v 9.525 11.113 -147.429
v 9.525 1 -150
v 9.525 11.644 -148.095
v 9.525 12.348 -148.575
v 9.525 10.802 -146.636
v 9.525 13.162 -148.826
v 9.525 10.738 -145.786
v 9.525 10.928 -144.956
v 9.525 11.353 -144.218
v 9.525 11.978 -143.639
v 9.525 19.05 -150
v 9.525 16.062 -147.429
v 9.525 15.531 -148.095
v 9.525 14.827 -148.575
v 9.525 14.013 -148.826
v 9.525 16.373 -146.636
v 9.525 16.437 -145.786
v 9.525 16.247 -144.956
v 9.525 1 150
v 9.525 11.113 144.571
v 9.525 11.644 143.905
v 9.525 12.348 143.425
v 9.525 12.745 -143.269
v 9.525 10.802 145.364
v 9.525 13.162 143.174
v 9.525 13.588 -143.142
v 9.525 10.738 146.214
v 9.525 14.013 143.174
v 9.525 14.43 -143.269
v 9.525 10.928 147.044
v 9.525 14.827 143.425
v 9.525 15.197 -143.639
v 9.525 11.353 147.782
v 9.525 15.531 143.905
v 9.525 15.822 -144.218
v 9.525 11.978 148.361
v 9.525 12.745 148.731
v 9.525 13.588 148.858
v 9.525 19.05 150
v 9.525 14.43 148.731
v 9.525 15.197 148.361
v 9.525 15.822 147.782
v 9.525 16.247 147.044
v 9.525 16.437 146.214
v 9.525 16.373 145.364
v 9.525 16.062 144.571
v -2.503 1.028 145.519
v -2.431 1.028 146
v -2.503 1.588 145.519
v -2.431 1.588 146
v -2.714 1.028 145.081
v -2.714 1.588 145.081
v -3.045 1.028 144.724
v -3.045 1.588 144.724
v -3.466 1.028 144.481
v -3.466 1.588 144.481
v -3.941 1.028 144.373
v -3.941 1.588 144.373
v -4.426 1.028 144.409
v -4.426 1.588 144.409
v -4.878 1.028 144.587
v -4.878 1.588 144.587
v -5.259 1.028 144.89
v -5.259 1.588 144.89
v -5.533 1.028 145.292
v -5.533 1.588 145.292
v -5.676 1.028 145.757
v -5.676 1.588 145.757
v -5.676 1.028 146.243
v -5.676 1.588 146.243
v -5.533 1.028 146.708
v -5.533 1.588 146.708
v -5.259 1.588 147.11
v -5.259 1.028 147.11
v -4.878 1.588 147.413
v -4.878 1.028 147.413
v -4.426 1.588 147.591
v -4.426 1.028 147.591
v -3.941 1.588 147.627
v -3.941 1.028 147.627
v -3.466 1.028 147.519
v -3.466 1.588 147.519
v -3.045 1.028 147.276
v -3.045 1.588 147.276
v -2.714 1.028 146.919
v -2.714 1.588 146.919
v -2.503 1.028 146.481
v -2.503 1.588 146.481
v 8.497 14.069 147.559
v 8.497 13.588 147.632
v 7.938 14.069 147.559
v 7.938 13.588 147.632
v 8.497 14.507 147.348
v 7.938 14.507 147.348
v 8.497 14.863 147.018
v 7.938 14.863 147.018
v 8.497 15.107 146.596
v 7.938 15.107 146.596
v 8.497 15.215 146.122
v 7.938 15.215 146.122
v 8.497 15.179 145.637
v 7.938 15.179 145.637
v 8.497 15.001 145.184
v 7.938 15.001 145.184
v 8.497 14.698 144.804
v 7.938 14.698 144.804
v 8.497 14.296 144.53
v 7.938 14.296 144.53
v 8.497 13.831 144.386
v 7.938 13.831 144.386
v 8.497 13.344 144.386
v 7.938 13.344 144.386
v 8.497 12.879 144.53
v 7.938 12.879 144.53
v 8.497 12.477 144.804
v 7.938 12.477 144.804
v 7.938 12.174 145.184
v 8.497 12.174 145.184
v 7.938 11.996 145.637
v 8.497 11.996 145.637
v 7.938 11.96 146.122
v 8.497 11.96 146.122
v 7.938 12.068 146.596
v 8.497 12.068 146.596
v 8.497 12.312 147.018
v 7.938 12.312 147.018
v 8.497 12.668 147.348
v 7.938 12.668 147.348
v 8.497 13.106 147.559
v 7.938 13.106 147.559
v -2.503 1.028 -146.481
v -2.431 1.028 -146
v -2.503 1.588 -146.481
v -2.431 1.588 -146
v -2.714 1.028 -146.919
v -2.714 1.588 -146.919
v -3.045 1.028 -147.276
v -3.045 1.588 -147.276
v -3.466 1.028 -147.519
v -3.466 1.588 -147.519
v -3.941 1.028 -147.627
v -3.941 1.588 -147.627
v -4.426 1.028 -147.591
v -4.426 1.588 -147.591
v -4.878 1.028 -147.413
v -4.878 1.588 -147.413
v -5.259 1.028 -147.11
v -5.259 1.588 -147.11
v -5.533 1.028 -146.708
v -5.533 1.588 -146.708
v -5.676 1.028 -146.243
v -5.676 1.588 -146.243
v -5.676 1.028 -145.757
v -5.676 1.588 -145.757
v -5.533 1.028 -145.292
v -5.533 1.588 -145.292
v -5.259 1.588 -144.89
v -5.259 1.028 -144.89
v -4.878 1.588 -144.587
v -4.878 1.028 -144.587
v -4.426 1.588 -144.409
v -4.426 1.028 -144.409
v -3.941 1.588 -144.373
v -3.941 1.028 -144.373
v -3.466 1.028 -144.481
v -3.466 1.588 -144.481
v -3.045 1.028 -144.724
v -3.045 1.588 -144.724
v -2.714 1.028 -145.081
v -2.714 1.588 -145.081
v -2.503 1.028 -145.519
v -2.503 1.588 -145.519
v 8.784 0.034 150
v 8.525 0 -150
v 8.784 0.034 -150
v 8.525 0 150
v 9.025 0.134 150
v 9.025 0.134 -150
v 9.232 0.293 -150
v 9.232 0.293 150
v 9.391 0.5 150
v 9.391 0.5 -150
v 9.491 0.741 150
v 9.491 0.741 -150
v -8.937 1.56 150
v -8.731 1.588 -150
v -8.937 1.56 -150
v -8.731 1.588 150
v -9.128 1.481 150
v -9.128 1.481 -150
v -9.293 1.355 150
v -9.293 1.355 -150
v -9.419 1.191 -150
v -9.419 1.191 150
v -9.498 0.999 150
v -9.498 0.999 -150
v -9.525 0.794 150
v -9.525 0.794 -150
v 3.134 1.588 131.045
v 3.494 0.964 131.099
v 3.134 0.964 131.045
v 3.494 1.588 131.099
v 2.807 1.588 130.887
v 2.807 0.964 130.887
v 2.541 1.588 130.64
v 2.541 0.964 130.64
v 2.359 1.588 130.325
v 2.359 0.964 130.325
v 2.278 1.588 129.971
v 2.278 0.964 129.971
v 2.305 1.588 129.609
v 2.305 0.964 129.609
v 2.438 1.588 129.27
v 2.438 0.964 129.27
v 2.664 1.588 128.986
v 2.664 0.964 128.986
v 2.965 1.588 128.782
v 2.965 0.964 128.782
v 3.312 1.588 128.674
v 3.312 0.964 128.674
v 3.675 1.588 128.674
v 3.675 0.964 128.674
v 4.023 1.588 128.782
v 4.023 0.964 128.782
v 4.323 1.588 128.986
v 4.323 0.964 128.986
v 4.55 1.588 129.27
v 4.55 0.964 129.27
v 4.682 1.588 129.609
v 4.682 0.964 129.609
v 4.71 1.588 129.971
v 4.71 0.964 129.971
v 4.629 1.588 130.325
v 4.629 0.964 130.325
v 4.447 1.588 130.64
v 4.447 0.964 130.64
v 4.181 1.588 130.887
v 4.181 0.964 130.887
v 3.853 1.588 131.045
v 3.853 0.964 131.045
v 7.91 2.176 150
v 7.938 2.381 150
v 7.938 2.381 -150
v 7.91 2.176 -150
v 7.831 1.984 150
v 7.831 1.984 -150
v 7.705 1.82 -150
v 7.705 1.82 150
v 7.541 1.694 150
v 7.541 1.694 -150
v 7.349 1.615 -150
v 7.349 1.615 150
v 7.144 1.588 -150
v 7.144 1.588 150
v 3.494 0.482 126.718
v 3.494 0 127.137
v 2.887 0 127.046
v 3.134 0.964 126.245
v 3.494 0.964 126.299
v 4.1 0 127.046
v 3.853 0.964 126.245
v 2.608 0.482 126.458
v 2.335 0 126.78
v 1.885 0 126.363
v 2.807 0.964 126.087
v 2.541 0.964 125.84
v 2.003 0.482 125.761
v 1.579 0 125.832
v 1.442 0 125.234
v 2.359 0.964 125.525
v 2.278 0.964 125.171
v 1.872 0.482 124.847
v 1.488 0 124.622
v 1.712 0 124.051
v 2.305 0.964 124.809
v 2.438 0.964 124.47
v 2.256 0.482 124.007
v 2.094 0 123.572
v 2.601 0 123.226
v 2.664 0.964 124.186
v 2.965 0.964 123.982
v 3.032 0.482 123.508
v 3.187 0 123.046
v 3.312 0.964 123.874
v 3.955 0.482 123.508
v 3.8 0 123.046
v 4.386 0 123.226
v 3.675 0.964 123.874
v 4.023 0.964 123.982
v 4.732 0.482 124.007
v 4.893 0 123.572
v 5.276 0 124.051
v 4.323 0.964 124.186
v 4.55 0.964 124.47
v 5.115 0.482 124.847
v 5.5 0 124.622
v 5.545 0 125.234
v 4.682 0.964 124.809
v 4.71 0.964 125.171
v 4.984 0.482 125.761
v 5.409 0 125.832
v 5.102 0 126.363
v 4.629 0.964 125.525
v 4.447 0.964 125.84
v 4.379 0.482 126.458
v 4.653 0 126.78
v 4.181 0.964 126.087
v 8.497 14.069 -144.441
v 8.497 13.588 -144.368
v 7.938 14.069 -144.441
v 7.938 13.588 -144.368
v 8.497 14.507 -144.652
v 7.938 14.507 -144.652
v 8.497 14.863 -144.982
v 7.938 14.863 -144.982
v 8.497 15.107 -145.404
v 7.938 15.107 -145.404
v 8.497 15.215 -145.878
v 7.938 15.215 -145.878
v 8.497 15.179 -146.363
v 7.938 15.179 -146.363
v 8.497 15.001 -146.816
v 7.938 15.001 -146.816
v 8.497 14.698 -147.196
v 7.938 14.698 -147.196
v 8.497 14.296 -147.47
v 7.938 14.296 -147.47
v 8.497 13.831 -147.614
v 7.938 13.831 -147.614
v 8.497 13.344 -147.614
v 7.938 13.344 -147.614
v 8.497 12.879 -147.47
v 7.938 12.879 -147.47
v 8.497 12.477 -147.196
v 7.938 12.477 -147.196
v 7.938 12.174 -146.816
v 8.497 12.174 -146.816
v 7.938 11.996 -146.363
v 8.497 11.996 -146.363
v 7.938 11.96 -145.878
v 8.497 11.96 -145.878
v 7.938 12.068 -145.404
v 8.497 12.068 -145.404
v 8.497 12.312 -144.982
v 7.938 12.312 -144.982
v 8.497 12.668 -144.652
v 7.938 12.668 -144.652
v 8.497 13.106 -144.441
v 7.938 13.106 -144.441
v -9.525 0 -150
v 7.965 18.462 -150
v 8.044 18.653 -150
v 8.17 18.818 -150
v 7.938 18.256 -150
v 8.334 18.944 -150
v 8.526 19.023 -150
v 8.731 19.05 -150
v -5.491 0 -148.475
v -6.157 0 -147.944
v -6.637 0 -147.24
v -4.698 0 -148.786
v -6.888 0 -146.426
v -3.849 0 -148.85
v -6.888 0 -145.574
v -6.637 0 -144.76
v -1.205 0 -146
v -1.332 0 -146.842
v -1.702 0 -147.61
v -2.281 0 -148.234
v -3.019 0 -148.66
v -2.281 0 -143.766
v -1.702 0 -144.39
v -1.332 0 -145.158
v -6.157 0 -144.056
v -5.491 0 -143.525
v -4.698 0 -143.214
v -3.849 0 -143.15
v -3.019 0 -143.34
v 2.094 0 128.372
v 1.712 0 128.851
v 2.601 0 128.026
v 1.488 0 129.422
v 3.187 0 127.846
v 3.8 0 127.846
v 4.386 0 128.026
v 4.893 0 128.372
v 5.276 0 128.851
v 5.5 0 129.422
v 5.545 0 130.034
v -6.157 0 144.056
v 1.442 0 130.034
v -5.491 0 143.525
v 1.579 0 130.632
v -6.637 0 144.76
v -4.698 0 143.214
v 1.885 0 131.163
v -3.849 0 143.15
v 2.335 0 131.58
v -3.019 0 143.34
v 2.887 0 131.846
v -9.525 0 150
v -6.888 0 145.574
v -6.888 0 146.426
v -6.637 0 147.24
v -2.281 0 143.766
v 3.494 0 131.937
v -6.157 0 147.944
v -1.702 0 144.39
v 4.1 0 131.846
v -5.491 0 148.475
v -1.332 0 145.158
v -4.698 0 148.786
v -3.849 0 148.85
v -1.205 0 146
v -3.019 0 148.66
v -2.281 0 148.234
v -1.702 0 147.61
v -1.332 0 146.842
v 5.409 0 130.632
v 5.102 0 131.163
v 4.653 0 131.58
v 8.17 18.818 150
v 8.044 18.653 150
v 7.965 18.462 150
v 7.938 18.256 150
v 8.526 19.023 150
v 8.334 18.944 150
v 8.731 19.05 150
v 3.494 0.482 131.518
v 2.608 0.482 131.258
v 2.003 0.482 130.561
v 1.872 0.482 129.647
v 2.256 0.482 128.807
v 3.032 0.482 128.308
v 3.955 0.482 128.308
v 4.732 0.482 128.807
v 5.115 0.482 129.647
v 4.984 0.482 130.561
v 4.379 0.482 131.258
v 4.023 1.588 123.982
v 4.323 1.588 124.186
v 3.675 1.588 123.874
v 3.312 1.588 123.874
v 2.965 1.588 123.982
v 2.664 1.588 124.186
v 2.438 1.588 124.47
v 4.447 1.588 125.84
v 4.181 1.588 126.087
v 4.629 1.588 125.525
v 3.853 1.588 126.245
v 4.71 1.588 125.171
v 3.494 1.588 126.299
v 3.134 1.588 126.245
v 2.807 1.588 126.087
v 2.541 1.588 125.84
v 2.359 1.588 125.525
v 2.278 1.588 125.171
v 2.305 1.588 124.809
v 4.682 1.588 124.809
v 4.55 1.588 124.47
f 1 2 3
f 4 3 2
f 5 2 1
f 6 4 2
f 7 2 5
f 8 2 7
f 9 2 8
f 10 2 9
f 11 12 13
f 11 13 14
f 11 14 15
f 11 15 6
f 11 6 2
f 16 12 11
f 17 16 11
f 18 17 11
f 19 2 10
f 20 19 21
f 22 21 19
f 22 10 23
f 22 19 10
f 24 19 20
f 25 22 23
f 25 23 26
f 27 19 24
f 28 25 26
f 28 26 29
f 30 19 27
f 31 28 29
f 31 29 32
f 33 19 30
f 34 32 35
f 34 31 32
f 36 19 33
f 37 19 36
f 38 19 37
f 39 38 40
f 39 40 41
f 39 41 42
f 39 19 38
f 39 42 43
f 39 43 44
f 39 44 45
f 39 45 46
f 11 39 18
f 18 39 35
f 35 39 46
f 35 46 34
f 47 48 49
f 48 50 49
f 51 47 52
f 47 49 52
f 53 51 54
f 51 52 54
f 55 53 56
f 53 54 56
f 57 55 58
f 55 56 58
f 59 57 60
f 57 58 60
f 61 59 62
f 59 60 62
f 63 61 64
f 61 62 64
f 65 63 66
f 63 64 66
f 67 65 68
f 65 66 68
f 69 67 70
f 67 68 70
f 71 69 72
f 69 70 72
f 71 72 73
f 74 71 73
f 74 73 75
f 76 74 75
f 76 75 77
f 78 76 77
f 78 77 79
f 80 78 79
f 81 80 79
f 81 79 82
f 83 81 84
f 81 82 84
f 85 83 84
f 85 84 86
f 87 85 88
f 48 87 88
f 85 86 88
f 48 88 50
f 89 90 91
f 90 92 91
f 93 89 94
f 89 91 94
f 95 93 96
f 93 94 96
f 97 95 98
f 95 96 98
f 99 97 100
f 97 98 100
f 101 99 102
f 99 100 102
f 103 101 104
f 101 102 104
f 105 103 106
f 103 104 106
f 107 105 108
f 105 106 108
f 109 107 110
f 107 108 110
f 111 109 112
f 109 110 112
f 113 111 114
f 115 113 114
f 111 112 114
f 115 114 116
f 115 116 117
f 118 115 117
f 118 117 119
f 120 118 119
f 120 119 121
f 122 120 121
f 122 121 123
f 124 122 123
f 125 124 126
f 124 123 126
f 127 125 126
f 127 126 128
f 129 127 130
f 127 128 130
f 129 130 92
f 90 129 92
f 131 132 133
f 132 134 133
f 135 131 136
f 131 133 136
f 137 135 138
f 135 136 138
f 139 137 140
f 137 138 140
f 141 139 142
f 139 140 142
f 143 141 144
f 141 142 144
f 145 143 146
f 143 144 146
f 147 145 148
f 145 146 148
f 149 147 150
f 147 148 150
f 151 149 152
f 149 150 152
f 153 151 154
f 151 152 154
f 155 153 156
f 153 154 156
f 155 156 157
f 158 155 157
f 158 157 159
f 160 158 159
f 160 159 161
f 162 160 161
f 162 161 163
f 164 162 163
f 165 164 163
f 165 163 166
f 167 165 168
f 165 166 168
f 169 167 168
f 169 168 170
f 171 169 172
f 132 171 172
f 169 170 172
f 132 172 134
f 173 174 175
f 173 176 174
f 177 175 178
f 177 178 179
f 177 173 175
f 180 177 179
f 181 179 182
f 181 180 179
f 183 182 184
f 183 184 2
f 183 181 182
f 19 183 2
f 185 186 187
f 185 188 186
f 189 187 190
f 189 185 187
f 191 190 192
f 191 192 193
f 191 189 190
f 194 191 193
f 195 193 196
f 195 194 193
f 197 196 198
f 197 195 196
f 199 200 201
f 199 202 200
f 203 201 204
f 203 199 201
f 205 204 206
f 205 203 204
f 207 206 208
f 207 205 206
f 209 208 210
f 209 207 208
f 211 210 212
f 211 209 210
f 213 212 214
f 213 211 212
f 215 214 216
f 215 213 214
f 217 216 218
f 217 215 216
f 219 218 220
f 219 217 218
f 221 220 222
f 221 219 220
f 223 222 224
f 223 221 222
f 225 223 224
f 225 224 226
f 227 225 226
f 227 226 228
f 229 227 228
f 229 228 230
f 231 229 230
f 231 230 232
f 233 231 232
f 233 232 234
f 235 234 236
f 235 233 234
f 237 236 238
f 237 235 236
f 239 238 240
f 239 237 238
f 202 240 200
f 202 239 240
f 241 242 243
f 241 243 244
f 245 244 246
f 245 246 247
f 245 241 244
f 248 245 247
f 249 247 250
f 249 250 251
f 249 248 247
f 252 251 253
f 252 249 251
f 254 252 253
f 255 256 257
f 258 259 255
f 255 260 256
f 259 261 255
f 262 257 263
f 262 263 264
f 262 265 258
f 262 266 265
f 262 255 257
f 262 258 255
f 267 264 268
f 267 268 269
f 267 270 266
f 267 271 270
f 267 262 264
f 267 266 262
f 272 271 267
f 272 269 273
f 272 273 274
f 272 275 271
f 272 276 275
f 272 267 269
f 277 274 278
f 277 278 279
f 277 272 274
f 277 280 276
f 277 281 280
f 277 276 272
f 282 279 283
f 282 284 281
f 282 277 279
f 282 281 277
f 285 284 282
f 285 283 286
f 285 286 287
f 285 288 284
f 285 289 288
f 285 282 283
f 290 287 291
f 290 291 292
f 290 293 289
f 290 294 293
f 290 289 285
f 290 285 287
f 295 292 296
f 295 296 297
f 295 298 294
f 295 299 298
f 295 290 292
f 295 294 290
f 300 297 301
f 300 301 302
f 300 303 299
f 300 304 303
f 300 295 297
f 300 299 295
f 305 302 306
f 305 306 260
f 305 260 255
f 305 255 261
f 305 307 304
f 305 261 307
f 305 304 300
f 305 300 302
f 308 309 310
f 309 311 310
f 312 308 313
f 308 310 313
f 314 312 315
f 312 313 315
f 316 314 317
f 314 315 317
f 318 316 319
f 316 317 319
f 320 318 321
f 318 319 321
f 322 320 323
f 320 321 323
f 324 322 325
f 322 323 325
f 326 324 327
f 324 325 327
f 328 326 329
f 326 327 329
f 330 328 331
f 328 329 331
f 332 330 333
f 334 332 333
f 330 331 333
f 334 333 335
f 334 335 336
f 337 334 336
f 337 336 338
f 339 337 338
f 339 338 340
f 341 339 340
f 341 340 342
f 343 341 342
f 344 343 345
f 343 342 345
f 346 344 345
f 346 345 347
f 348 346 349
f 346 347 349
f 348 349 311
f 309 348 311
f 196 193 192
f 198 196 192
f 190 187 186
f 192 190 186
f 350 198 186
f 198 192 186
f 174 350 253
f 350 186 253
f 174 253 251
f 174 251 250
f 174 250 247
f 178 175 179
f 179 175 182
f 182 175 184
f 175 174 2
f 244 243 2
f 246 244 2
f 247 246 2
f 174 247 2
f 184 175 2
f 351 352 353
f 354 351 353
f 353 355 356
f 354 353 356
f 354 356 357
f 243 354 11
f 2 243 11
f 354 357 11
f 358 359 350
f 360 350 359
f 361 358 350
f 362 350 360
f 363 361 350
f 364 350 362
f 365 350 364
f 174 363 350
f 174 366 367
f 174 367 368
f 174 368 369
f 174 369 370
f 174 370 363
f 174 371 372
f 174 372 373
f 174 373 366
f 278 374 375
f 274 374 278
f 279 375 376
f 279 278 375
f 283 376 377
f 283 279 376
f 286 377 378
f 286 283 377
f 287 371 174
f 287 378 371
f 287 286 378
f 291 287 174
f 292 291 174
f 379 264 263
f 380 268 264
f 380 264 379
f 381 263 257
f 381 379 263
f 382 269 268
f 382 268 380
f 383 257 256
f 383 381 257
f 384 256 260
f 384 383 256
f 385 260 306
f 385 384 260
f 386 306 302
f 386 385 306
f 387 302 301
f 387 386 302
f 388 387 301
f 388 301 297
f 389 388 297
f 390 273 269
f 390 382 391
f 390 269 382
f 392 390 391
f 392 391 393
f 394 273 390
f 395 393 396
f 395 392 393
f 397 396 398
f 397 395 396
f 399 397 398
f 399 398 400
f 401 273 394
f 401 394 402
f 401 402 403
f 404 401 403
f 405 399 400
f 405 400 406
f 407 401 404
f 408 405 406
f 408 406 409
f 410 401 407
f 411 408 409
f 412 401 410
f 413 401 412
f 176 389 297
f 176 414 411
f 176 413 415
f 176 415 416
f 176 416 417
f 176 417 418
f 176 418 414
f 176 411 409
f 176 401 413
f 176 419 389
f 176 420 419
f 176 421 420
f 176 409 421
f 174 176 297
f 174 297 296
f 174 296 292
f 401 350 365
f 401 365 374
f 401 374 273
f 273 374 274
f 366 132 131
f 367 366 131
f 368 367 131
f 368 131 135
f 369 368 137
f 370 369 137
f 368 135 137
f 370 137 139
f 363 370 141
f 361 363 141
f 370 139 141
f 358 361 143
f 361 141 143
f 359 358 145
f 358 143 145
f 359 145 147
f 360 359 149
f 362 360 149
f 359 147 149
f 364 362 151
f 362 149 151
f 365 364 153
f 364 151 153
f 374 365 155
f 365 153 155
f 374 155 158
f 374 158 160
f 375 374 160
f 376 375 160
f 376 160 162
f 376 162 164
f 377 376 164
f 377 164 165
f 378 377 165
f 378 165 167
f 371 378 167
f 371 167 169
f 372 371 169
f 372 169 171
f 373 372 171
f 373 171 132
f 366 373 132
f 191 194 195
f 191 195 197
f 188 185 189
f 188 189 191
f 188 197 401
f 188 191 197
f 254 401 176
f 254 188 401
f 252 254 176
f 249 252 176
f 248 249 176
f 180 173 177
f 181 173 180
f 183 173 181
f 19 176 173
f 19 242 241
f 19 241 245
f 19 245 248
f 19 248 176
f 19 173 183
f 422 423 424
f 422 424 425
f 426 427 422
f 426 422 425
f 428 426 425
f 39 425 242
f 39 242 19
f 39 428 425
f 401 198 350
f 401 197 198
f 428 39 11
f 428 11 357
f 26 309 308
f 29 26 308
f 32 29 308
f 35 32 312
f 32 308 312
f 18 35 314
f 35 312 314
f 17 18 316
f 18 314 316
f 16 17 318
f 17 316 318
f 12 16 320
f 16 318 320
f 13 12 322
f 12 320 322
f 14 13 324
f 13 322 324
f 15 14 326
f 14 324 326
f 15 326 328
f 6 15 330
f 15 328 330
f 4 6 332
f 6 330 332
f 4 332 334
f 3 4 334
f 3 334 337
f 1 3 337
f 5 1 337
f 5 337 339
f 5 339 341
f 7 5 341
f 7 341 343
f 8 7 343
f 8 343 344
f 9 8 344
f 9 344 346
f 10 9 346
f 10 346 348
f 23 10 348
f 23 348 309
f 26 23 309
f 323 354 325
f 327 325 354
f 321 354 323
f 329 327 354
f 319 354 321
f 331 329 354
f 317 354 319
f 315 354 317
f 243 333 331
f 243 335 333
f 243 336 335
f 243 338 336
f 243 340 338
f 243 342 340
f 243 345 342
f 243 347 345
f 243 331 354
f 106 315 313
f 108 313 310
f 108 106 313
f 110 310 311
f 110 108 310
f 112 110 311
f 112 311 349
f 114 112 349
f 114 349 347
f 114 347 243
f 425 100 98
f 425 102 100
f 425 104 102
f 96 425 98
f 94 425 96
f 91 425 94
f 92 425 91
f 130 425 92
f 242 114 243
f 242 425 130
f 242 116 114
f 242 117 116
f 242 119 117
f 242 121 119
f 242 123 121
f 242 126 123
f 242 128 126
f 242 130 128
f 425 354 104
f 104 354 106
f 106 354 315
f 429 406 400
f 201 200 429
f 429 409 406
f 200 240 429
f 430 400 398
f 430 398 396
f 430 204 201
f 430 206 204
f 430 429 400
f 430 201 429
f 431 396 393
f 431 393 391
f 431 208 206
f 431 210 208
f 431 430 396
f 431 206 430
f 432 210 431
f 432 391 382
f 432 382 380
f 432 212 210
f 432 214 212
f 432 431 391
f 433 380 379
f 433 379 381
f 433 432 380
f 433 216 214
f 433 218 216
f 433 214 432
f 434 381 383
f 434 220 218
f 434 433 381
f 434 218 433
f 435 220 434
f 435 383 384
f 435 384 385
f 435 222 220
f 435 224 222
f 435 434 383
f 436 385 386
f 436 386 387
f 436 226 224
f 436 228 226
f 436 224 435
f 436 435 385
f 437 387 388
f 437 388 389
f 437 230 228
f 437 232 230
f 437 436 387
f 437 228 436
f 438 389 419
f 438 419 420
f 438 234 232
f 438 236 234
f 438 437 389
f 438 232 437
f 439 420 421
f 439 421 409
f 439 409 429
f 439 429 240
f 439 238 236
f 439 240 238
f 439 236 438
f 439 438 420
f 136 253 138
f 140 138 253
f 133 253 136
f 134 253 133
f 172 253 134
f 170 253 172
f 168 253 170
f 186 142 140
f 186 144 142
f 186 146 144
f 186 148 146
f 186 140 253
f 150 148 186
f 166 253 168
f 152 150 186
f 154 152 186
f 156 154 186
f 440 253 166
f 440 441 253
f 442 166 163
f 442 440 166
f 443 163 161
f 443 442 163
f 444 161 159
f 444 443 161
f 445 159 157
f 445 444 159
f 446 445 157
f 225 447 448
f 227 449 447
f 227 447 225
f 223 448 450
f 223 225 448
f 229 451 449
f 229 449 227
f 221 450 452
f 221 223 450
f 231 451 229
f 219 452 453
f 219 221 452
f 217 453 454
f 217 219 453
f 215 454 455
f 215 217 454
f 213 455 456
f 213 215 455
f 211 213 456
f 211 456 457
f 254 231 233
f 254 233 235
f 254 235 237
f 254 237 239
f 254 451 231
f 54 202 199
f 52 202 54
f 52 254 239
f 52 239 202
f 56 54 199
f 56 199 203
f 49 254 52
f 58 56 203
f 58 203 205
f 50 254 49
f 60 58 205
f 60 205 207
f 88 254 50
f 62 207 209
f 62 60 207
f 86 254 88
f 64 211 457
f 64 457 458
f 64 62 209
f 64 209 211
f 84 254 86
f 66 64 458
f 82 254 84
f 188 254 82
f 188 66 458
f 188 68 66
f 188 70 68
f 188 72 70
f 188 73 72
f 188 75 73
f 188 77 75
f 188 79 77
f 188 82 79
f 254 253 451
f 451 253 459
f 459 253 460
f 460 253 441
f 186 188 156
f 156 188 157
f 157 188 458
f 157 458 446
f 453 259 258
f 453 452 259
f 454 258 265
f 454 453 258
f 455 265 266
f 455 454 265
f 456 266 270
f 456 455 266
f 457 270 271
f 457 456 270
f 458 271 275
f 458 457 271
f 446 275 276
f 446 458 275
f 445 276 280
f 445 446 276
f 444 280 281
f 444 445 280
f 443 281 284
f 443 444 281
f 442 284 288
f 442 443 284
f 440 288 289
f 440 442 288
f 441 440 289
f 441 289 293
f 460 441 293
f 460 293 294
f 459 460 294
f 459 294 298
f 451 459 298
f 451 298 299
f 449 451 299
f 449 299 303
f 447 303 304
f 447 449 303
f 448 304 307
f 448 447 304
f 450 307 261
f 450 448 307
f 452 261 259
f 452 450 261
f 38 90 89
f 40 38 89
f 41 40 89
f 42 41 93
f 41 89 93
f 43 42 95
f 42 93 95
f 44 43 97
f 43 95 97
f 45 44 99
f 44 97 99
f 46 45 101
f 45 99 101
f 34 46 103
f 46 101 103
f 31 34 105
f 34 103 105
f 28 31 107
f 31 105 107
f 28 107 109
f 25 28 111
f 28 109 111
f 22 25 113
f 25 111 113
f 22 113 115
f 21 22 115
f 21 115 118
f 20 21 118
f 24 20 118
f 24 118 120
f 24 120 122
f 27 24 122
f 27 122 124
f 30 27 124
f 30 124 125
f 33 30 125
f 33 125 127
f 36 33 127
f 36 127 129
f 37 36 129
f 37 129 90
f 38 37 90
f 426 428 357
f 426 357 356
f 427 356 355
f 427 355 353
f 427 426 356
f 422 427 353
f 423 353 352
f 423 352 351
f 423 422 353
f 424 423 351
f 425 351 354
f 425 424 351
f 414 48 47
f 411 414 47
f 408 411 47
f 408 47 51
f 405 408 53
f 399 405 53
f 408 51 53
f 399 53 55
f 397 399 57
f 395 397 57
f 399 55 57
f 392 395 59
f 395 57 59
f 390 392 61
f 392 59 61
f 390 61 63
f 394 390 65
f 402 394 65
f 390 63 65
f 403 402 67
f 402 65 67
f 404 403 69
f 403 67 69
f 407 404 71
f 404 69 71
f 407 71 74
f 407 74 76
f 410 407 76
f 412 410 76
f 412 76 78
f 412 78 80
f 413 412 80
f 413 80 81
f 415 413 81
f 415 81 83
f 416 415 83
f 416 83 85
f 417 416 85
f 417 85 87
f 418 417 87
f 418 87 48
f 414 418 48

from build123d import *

# Parameters (mm, degrees)
BOSS_EXTRUDE1_DEPTH                               = 150
CSK_FOR_4_FLAT_HEAD_MACHINE_SCREW_100_D           = 3.2639
CSK_FOR_4_FLAT_HEAD_MACHINE_SCREW_100_CSINK_D     = 5.715
CSK_FOR_4_FLAT_HEAD_MACHINE_SCREW_100_CSINK_ANGLE = 100
CSK_FOR_4_FLAT_HEAD_MACHINE_SCREW_2_D             = 3.2639
CSK_FOR_4_FLAT_HEAD_MACHINE_SCREW_2_CSINK_D       = 5.715
CSK_FOR_4_FLAT_HEAD_MACHINE_SCREW_2_CSINK_ANGLE   = 100
FILLET1_R                                         = 1
F_2_CLEARANCE_HOLE1_AT_2_COUNT                    = 2
F_2_CLEARANCE_HOLE1_AT_2_PITCH                    = 4.8


with BuildPart() as part:
    # Sketch2 → Boss-Extrude1 (new, symmetric)
    with BuildSketch(Plane.XY):
        with BuildLine():
            Line((-9.525, 0), (9.525, 0))
            Line((9.525, 0), (9.525, 19.05))
            Line((9.525, 19.05), (8.73125, 19.05))
            ThreePointArc((8.73125, 19.05), (8.169983992, 18.817516008), (7.9375, 18.25625))
            Line((7.9375, 18.25625), (7.9375, 2.38125))
            ThreePointArc((7.9375, 2.38125), (7.705016008, 1.819983992), (7.14375, 1.5875))
            Line((7.14375, 1.5875), (-8.73125, 1.5875))
            ThreePointArc((-8.73125, 1.5875), (-9.292516008, 1.355016008), (-9.525, 0.79375))
            Line((-9.525, 0.79375), (-9.525, 0))
        make_face()
    extrude(amount=BOSS_EXTRUDE1_DEPTH, both=True)

    # CSK for _4 Flat Head Machine Screw _100 (through all)
    with Locations(Plane(origin=(0, 0, 0), x_dir=(-1, 0, 0), z_dir=(0, -1, 0))):
        with Locations((4.0625, -146), (4.0625, 146)):
            CounterSinkHole(CSK_FOR_4_FLAT_HEAD_MACHINE_SCREW_100_D / 2, CSK_FOR_4_FLAT_HEAD_MACHINE_SCREW_100_CSINK_D / 2, counter_sink_angle=CSK_FOR_4_FLAT_HEAD_MACHINE_SCREW_100_CSINK_ANGLE)

    # CSK for _4 Flat Head Machine Screw _ 2 (through all)
    with Locations(Plane(origin=(9.525, 0, 0), x_dir=(0, 0, -1), z_dir=(1, 0, 0))):
        with Locations((-146, 13.5875), (146, 13.5875)):
            CounterSinkHole(CSK_FOR_4_FLAT_HEAD_MACHINE_SCREW_2_D / 2, CSK_FOR_4_FLAT_HEAD_MACHINE_SCREW_2_CSINK_D / 2, counter_sink_angle=CSK_FOR_4_FLAT_HEAD_MACHINE_SCREW_2_CSINK_ANGLE)

    # Fillet1
    fillet1_edges = [part.edges().sort_by_distance(p)[0] for p in [
        (9.525, 0, 0),
    ]]
    fillet(fillet1_edges, radius=FILLET1_R)

    # Sketch30 → #2 Clearance Hole1 (revolve, cut)
    with BuildSketch(Plane(origin=(3.49375, 1.5875, 129.88), x_dir=(0, 0, 1), z_dir=(1, 0, 0))):
        Polygon((0, 0), (0, 1.5875), (2.0574, 1.5875), (1.2192, 0.623261201), (1.2192, 0), align=None)
    f_2_clearance_hole1 = revolve(axis=Axis((3.49375, 7.9375, 129.88), (0, -1, 0)), mode=Mode.SUBTRACT)

    # #2 Clearance Hole1 at 2: #2 Clearance Hole1 ×2
    with Locations(*[(0, 0, -i * F_2_CLEARANCE_HOLE1_AT_2_PITCH) for i in range(1, F_2_CLEARANCE_HOLE1_AT_2_COUNT)]):
        add(f_2_clearance_hole1, mode=Mode.SUBTRACT)


solid = part.part
